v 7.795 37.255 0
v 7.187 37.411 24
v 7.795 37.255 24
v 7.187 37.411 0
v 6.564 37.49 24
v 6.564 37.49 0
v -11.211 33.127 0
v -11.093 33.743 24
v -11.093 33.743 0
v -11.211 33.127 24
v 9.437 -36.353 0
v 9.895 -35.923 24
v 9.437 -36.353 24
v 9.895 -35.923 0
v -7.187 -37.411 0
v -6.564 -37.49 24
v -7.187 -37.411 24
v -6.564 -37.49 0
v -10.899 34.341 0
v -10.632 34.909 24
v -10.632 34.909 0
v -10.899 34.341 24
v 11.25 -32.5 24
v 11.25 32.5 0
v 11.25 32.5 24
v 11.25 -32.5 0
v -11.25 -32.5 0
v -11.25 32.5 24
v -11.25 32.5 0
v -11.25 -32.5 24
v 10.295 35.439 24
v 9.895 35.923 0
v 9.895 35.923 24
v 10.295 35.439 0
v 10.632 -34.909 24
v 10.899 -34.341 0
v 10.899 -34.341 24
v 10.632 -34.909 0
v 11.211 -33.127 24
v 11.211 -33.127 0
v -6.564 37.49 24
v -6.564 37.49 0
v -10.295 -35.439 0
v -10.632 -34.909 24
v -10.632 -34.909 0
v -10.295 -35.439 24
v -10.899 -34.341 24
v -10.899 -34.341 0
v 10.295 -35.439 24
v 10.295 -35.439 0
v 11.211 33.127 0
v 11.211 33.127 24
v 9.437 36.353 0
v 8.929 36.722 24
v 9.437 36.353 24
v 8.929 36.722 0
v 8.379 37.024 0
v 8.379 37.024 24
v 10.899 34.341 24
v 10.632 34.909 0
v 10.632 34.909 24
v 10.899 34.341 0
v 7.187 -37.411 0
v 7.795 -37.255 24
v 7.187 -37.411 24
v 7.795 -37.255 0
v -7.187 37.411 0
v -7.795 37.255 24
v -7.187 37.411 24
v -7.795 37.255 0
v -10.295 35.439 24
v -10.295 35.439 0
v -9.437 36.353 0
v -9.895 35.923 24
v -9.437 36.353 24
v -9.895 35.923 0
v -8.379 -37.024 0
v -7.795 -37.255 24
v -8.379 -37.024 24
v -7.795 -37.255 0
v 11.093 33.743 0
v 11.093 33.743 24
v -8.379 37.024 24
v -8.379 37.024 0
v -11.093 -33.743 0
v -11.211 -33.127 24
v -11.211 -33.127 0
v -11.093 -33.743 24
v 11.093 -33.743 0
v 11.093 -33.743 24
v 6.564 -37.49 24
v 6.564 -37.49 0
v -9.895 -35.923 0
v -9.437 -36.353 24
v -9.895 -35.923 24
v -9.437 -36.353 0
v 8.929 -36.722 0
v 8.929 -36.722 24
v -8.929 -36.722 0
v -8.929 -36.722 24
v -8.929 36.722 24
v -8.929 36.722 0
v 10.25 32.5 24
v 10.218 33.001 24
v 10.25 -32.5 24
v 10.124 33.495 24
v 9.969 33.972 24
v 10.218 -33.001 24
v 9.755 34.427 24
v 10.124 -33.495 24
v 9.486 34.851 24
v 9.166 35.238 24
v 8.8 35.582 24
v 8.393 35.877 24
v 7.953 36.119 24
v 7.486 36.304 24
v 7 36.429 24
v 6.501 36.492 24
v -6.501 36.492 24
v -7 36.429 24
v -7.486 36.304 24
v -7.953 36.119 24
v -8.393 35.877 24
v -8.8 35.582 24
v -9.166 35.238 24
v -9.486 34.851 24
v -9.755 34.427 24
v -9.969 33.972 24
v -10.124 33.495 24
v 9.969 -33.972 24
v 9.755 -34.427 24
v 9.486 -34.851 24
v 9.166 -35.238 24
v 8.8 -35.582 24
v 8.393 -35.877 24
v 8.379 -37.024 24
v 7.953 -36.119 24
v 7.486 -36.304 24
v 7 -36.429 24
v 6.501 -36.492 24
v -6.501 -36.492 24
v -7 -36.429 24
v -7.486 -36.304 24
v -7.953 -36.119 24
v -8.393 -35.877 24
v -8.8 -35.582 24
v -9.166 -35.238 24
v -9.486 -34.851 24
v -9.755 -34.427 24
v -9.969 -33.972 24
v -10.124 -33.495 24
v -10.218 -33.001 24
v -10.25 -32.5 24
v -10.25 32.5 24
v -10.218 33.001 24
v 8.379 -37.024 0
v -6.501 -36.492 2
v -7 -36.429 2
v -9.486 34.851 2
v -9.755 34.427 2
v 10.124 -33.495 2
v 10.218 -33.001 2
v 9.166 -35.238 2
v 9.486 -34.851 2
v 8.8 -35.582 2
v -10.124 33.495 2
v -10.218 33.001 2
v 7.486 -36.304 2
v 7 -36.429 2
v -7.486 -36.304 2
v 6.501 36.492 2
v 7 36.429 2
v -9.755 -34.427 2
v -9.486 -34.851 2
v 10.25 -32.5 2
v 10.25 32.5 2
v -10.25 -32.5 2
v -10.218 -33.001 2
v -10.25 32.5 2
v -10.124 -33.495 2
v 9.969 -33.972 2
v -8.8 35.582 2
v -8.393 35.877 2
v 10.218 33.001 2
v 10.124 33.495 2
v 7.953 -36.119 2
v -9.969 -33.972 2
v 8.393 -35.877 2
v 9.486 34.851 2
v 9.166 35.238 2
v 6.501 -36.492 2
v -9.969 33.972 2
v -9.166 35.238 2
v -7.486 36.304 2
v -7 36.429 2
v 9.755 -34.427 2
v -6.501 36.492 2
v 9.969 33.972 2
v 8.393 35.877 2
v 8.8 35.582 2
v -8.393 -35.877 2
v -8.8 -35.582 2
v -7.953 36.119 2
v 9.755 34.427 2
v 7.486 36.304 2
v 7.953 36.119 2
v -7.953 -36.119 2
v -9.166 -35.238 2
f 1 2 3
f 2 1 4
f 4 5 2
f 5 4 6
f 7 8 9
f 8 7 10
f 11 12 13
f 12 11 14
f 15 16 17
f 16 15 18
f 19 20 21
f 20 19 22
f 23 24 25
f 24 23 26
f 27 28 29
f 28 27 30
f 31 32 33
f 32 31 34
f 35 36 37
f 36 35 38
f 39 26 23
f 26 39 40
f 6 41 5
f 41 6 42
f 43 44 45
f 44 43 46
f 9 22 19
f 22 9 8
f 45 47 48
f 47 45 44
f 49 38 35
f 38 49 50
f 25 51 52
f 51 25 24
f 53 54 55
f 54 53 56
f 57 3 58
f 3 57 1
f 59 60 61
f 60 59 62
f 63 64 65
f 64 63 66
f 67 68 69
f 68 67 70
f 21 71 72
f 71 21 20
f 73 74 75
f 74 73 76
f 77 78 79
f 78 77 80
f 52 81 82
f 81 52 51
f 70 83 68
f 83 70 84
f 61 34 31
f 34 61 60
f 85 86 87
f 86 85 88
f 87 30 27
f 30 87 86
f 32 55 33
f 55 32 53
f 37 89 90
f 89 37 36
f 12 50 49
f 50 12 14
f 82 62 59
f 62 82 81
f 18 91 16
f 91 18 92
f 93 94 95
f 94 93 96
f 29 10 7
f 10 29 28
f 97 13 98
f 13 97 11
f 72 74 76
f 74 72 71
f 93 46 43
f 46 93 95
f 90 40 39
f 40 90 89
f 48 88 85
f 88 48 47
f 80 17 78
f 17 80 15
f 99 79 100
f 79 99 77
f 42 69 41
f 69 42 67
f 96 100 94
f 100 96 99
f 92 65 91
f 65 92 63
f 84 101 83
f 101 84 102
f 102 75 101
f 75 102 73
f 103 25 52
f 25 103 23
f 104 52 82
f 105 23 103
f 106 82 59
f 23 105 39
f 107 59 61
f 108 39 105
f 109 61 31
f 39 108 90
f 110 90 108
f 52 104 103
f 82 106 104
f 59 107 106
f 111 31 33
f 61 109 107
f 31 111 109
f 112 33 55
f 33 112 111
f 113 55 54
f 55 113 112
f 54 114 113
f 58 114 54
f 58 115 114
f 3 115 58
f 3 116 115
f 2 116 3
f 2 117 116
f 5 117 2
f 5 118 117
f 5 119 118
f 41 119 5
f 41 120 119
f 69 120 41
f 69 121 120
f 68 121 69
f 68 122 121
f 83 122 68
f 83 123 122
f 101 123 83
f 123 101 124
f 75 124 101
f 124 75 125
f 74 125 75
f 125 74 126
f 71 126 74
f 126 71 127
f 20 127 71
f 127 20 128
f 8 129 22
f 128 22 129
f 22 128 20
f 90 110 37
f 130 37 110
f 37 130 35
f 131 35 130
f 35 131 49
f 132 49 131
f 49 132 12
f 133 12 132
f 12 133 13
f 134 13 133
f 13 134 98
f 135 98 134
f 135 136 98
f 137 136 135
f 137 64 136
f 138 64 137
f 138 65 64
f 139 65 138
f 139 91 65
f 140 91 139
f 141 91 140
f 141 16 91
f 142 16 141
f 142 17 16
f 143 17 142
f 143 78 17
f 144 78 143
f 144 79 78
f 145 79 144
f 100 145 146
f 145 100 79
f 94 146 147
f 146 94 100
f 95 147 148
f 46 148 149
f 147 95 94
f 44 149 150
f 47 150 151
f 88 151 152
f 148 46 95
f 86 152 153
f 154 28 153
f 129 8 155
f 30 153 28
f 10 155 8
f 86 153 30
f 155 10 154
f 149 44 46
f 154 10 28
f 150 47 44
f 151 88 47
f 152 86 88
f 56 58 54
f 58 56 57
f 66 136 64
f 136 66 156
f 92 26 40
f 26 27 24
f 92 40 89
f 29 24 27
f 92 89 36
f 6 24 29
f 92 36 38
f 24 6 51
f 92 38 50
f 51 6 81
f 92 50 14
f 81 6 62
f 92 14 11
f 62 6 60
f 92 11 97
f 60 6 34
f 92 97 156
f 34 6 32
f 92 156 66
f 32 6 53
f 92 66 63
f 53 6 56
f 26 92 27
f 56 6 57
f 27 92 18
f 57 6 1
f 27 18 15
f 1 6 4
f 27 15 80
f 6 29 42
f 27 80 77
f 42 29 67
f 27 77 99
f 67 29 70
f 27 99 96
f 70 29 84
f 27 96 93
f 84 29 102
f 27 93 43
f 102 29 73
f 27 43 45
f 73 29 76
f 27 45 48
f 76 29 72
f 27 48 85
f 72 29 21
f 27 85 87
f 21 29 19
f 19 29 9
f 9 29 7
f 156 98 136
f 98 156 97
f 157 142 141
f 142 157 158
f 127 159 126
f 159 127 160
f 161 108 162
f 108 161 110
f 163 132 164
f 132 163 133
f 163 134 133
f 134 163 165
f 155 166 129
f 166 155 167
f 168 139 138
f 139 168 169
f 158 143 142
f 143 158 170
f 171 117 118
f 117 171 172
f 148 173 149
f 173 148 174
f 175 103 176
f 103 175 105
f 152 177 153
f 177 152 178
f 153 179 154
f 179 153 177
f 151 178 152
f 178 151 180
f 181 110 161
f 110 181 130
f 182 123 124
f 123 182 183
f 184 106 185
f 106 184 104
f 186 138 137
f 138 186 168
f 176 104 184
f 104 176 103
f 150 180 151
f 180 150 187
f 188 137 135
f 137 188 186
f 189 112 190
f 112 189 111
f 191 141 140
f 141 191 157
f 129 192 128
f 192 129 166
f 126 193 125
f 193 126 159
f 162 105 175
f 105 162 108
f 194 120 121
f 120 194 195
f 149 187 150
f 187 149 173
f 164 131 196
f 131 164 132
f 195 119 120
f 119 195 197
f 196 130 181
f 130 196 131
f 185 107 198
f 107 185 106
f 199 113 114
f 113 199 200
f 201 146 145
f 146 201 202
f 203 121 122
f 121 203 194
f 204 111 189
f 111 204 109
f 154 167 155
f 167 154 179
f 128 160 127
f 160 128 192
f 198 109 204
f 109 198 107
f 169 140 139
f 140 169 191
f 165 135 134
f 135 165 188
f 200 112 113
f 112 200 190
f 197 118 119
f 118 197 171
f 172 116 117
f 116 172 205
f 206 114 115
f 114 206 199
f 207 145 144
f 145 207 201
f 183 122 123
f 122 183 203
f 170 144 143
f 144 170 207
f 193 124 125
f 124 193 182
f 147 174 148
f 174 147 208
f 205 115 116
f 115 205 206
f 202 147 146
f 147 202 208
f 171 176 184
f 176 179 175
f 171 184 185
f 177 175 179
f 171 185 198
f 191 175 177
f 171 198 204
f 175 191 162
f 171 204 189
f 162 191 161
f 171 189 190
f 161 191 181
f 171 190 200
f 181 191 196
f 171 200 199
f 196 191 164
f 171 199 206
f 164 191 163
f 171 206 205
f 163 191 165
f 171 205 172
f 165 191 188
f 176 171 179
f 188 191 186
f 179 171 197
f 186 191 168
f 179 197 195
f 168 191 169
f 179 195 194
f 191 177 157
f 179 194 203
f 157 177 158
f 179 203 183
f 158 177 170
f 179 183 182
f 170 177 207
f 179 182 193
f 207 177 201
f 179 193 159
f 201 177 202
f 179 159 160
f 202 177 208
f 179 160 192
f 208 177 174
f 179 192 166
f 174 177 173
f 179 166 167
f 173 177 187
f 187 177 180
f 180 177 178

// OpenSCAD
$fn = 50;


difference() {
	union() {
		hull() {
			translate(v = [-6.2500000000, 32.5000000000, 0]) {
				cylinder(h = 24, r = 5);
			}
			translate(v = [6.2500000000, 32.5000000000, 0]) {
				cylinder(h = 24, r = 5);
			}
			translate(v = [-6.2500000000, -32.5000000000, 0]) {
				cylinder(h = 24, r = 5);
			}
			translate(v = [6.2500000000, -32.5000000000, 0]) {
				cylinder(h = 24, r = 5);
			}
		}
	}
	union() {
		translate(v = [0, 0, 2]) {
			hull() {
				translate(v = [-6.2500000000, 32.5000000000, 0]) {
					cylinder(h = 22, r = 4);
				}
				translate(v = [6.2500000000, 32.5000000000, 0]) {
					cylinder(h = 22, r = 4);
				}
				translate(v = [-6.2500000000, -32.5000000000, 0]) {
					cylinder(h = 22, r = 4);
				}
				translate(v = [6.2500000000, -32.5000000000, 0]) {
					cylinder(h = 22, r = 4);
				}
			}
		}
	}
}
